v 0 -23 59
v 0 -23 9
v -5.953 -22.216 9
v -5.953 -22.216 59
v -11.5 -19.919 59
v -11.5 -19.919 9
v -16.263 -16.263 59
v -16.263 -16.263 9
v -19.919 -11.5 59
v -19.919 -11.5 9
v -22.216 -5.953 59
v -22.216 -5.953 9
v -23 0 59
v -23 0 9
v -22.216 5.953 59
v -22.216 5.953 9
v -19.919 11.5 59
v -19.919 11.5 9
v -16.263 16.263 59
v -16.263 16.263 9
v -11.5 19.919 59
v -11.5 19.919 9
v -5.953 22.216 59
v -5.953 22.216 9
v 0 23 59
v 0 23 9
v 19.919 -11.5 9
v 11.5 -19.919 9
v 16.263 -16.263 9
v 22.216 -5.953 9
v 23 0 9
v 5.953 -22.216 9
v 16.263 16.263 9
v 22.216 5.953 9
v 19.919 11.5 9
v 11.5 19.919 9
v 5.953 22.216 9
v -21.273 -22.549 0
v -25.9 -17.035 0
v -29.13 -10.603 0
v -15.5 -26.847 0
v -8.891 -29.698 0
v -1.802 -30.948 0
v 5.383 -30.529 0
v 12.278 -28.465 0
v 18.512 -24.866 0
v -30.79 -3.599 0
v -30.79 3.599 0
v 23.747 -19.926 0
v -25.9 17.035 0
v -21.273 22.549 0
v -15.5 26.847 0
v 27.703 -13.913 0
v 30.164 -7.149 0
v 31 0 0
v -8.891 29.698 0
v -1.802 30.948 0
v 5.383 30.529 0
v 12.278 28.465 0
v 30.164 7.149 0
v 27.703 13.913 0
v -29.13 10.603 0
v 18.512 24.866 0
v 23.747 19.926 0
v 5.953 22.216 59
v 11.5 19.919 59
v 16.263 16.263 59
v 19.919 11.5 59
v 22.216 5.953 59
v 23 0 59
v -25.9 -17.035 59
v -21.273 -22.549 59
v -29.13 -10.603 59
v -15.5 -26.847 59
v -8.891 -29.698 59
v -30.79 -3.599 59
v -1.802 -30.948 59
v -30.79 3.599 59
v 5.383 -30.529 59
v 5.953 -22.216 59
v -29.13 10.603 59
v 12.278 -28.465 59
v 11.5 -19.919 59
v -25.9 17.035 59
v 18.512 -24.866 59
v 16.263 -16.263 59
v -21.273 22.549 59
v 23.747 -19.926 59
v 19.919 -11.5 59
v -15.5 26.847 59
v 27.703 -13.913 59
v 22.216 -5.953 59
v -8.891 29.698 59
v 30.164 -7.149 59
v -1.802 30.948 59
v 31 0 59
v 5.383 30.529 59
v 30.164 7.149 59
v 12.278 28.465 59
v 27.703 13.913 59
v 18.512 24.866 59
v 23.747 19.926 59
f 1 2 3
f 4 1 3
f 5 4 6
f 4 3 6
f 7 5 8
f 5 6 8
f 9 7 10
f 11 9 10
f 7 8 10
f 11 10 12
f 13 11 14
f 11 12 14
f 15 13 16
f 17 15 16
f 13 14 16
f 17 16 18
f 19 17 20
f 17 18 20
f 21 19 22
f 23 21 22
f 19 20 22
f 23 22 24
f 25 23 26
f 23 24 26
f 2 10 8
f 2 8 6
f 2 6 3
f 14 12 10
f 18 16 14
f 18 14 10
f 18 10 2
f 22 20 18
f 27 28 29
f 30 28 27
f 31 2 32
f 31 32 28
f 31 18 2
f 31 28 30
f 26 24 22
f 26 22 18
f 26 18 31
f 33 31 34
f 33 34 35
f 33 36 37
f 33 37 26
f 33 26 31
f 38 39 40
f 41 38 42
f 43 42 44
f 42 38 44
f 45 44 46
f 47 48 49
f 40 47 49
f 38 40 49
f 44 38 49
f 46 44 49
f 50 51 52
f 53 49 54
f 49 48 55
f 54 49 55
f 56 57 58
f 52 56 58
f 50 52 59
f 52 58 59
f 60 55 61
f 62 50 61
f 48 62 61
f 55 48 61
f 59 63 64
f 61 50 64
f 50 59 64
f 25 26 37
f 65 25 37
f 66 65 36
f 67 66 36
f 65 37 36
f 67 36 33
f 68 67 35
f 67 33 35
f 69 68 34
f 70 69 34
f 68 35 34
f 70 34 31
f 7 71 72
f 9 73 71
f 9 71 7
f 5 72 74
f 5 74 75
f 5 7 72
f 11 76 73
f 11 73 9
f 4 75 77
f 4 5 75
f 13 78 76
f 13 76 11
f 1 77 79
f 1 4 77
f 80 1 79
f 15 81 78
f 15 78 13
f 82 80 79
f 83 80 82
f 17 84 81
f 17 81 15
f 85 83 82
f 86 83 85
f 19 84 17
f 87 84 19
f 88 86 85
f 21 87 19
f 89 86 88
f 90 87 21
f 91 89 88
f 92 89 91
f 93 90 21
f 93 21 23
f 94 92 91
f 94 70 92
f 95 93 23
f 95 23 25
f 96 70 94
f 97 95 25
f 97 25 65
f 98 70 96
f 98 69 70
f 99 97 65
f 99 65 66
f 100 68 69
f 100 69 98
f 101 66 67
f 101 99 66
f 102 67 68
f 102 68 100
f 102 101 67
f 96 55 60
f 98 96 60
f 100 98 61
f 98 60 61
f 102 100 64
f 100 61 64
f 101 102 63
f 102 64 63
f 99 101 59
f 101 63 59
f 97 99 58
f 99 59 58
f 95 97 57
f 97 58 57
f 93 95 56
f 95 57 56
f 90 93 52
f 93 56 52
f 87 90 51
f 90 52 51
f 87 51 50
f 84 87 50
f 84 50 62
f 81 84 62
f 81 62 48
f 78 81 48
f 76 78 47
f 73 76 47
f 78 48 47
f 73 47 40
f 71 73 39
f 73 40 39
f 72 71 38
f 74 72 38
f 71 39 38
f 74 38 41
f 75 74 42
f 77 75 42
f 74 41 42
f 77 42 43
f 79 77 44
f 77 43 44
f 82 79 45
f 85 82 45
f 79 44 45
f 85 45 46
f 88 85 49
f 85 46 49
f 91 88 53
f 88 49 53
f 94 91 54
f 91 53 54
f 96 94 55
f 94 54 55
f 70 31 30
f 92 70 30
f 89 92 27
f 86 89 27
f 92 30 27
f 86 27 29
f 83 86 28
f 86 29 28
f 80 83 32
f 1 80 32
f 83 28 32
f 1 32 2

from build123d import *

# Parameters (mm, degrees)
F0_R     = 31
F1_DEPTH = 59
F2_DEPTH = 9


with BuildPart() as f1:
    # F0 (on Top) → F1 (new body)
    with BuildSketch(Plane.XY):
        Circle(F0_R)
        with BuildLine():
            ThreePointArc((0, 23), (16.263456, 16.263456), (23, 0))
            ThreePointArc((23, 0), (16.263456, -16.263456), (0, -23))
            ThreePointArc((0, -23), (-23, 0), (0, 23))
        make_face(mode=Mode.SUBTRACT)
    extrude(amount=F1_DEPTH)

    # F0 (on Top) → F2 (join)
    with BuildSketch(Plane.XY):
        with BuildLine():
            Line((0, -23), (0, 23))
            ThreePointArc((0, 23), (-23, 0), (0, -23))
        make_face()
        with BuildLine():
            ThreePointArc((0, -23), (16.263456, -16.263456), (23, 0))
            ThreePointArc((23, 0), (16.263456, 16.263456), (0, 23))
            Line((0, 23), (0, -23))
        make_face()
    extrude(amount=F2_DEPTH)


solid = f1.part
